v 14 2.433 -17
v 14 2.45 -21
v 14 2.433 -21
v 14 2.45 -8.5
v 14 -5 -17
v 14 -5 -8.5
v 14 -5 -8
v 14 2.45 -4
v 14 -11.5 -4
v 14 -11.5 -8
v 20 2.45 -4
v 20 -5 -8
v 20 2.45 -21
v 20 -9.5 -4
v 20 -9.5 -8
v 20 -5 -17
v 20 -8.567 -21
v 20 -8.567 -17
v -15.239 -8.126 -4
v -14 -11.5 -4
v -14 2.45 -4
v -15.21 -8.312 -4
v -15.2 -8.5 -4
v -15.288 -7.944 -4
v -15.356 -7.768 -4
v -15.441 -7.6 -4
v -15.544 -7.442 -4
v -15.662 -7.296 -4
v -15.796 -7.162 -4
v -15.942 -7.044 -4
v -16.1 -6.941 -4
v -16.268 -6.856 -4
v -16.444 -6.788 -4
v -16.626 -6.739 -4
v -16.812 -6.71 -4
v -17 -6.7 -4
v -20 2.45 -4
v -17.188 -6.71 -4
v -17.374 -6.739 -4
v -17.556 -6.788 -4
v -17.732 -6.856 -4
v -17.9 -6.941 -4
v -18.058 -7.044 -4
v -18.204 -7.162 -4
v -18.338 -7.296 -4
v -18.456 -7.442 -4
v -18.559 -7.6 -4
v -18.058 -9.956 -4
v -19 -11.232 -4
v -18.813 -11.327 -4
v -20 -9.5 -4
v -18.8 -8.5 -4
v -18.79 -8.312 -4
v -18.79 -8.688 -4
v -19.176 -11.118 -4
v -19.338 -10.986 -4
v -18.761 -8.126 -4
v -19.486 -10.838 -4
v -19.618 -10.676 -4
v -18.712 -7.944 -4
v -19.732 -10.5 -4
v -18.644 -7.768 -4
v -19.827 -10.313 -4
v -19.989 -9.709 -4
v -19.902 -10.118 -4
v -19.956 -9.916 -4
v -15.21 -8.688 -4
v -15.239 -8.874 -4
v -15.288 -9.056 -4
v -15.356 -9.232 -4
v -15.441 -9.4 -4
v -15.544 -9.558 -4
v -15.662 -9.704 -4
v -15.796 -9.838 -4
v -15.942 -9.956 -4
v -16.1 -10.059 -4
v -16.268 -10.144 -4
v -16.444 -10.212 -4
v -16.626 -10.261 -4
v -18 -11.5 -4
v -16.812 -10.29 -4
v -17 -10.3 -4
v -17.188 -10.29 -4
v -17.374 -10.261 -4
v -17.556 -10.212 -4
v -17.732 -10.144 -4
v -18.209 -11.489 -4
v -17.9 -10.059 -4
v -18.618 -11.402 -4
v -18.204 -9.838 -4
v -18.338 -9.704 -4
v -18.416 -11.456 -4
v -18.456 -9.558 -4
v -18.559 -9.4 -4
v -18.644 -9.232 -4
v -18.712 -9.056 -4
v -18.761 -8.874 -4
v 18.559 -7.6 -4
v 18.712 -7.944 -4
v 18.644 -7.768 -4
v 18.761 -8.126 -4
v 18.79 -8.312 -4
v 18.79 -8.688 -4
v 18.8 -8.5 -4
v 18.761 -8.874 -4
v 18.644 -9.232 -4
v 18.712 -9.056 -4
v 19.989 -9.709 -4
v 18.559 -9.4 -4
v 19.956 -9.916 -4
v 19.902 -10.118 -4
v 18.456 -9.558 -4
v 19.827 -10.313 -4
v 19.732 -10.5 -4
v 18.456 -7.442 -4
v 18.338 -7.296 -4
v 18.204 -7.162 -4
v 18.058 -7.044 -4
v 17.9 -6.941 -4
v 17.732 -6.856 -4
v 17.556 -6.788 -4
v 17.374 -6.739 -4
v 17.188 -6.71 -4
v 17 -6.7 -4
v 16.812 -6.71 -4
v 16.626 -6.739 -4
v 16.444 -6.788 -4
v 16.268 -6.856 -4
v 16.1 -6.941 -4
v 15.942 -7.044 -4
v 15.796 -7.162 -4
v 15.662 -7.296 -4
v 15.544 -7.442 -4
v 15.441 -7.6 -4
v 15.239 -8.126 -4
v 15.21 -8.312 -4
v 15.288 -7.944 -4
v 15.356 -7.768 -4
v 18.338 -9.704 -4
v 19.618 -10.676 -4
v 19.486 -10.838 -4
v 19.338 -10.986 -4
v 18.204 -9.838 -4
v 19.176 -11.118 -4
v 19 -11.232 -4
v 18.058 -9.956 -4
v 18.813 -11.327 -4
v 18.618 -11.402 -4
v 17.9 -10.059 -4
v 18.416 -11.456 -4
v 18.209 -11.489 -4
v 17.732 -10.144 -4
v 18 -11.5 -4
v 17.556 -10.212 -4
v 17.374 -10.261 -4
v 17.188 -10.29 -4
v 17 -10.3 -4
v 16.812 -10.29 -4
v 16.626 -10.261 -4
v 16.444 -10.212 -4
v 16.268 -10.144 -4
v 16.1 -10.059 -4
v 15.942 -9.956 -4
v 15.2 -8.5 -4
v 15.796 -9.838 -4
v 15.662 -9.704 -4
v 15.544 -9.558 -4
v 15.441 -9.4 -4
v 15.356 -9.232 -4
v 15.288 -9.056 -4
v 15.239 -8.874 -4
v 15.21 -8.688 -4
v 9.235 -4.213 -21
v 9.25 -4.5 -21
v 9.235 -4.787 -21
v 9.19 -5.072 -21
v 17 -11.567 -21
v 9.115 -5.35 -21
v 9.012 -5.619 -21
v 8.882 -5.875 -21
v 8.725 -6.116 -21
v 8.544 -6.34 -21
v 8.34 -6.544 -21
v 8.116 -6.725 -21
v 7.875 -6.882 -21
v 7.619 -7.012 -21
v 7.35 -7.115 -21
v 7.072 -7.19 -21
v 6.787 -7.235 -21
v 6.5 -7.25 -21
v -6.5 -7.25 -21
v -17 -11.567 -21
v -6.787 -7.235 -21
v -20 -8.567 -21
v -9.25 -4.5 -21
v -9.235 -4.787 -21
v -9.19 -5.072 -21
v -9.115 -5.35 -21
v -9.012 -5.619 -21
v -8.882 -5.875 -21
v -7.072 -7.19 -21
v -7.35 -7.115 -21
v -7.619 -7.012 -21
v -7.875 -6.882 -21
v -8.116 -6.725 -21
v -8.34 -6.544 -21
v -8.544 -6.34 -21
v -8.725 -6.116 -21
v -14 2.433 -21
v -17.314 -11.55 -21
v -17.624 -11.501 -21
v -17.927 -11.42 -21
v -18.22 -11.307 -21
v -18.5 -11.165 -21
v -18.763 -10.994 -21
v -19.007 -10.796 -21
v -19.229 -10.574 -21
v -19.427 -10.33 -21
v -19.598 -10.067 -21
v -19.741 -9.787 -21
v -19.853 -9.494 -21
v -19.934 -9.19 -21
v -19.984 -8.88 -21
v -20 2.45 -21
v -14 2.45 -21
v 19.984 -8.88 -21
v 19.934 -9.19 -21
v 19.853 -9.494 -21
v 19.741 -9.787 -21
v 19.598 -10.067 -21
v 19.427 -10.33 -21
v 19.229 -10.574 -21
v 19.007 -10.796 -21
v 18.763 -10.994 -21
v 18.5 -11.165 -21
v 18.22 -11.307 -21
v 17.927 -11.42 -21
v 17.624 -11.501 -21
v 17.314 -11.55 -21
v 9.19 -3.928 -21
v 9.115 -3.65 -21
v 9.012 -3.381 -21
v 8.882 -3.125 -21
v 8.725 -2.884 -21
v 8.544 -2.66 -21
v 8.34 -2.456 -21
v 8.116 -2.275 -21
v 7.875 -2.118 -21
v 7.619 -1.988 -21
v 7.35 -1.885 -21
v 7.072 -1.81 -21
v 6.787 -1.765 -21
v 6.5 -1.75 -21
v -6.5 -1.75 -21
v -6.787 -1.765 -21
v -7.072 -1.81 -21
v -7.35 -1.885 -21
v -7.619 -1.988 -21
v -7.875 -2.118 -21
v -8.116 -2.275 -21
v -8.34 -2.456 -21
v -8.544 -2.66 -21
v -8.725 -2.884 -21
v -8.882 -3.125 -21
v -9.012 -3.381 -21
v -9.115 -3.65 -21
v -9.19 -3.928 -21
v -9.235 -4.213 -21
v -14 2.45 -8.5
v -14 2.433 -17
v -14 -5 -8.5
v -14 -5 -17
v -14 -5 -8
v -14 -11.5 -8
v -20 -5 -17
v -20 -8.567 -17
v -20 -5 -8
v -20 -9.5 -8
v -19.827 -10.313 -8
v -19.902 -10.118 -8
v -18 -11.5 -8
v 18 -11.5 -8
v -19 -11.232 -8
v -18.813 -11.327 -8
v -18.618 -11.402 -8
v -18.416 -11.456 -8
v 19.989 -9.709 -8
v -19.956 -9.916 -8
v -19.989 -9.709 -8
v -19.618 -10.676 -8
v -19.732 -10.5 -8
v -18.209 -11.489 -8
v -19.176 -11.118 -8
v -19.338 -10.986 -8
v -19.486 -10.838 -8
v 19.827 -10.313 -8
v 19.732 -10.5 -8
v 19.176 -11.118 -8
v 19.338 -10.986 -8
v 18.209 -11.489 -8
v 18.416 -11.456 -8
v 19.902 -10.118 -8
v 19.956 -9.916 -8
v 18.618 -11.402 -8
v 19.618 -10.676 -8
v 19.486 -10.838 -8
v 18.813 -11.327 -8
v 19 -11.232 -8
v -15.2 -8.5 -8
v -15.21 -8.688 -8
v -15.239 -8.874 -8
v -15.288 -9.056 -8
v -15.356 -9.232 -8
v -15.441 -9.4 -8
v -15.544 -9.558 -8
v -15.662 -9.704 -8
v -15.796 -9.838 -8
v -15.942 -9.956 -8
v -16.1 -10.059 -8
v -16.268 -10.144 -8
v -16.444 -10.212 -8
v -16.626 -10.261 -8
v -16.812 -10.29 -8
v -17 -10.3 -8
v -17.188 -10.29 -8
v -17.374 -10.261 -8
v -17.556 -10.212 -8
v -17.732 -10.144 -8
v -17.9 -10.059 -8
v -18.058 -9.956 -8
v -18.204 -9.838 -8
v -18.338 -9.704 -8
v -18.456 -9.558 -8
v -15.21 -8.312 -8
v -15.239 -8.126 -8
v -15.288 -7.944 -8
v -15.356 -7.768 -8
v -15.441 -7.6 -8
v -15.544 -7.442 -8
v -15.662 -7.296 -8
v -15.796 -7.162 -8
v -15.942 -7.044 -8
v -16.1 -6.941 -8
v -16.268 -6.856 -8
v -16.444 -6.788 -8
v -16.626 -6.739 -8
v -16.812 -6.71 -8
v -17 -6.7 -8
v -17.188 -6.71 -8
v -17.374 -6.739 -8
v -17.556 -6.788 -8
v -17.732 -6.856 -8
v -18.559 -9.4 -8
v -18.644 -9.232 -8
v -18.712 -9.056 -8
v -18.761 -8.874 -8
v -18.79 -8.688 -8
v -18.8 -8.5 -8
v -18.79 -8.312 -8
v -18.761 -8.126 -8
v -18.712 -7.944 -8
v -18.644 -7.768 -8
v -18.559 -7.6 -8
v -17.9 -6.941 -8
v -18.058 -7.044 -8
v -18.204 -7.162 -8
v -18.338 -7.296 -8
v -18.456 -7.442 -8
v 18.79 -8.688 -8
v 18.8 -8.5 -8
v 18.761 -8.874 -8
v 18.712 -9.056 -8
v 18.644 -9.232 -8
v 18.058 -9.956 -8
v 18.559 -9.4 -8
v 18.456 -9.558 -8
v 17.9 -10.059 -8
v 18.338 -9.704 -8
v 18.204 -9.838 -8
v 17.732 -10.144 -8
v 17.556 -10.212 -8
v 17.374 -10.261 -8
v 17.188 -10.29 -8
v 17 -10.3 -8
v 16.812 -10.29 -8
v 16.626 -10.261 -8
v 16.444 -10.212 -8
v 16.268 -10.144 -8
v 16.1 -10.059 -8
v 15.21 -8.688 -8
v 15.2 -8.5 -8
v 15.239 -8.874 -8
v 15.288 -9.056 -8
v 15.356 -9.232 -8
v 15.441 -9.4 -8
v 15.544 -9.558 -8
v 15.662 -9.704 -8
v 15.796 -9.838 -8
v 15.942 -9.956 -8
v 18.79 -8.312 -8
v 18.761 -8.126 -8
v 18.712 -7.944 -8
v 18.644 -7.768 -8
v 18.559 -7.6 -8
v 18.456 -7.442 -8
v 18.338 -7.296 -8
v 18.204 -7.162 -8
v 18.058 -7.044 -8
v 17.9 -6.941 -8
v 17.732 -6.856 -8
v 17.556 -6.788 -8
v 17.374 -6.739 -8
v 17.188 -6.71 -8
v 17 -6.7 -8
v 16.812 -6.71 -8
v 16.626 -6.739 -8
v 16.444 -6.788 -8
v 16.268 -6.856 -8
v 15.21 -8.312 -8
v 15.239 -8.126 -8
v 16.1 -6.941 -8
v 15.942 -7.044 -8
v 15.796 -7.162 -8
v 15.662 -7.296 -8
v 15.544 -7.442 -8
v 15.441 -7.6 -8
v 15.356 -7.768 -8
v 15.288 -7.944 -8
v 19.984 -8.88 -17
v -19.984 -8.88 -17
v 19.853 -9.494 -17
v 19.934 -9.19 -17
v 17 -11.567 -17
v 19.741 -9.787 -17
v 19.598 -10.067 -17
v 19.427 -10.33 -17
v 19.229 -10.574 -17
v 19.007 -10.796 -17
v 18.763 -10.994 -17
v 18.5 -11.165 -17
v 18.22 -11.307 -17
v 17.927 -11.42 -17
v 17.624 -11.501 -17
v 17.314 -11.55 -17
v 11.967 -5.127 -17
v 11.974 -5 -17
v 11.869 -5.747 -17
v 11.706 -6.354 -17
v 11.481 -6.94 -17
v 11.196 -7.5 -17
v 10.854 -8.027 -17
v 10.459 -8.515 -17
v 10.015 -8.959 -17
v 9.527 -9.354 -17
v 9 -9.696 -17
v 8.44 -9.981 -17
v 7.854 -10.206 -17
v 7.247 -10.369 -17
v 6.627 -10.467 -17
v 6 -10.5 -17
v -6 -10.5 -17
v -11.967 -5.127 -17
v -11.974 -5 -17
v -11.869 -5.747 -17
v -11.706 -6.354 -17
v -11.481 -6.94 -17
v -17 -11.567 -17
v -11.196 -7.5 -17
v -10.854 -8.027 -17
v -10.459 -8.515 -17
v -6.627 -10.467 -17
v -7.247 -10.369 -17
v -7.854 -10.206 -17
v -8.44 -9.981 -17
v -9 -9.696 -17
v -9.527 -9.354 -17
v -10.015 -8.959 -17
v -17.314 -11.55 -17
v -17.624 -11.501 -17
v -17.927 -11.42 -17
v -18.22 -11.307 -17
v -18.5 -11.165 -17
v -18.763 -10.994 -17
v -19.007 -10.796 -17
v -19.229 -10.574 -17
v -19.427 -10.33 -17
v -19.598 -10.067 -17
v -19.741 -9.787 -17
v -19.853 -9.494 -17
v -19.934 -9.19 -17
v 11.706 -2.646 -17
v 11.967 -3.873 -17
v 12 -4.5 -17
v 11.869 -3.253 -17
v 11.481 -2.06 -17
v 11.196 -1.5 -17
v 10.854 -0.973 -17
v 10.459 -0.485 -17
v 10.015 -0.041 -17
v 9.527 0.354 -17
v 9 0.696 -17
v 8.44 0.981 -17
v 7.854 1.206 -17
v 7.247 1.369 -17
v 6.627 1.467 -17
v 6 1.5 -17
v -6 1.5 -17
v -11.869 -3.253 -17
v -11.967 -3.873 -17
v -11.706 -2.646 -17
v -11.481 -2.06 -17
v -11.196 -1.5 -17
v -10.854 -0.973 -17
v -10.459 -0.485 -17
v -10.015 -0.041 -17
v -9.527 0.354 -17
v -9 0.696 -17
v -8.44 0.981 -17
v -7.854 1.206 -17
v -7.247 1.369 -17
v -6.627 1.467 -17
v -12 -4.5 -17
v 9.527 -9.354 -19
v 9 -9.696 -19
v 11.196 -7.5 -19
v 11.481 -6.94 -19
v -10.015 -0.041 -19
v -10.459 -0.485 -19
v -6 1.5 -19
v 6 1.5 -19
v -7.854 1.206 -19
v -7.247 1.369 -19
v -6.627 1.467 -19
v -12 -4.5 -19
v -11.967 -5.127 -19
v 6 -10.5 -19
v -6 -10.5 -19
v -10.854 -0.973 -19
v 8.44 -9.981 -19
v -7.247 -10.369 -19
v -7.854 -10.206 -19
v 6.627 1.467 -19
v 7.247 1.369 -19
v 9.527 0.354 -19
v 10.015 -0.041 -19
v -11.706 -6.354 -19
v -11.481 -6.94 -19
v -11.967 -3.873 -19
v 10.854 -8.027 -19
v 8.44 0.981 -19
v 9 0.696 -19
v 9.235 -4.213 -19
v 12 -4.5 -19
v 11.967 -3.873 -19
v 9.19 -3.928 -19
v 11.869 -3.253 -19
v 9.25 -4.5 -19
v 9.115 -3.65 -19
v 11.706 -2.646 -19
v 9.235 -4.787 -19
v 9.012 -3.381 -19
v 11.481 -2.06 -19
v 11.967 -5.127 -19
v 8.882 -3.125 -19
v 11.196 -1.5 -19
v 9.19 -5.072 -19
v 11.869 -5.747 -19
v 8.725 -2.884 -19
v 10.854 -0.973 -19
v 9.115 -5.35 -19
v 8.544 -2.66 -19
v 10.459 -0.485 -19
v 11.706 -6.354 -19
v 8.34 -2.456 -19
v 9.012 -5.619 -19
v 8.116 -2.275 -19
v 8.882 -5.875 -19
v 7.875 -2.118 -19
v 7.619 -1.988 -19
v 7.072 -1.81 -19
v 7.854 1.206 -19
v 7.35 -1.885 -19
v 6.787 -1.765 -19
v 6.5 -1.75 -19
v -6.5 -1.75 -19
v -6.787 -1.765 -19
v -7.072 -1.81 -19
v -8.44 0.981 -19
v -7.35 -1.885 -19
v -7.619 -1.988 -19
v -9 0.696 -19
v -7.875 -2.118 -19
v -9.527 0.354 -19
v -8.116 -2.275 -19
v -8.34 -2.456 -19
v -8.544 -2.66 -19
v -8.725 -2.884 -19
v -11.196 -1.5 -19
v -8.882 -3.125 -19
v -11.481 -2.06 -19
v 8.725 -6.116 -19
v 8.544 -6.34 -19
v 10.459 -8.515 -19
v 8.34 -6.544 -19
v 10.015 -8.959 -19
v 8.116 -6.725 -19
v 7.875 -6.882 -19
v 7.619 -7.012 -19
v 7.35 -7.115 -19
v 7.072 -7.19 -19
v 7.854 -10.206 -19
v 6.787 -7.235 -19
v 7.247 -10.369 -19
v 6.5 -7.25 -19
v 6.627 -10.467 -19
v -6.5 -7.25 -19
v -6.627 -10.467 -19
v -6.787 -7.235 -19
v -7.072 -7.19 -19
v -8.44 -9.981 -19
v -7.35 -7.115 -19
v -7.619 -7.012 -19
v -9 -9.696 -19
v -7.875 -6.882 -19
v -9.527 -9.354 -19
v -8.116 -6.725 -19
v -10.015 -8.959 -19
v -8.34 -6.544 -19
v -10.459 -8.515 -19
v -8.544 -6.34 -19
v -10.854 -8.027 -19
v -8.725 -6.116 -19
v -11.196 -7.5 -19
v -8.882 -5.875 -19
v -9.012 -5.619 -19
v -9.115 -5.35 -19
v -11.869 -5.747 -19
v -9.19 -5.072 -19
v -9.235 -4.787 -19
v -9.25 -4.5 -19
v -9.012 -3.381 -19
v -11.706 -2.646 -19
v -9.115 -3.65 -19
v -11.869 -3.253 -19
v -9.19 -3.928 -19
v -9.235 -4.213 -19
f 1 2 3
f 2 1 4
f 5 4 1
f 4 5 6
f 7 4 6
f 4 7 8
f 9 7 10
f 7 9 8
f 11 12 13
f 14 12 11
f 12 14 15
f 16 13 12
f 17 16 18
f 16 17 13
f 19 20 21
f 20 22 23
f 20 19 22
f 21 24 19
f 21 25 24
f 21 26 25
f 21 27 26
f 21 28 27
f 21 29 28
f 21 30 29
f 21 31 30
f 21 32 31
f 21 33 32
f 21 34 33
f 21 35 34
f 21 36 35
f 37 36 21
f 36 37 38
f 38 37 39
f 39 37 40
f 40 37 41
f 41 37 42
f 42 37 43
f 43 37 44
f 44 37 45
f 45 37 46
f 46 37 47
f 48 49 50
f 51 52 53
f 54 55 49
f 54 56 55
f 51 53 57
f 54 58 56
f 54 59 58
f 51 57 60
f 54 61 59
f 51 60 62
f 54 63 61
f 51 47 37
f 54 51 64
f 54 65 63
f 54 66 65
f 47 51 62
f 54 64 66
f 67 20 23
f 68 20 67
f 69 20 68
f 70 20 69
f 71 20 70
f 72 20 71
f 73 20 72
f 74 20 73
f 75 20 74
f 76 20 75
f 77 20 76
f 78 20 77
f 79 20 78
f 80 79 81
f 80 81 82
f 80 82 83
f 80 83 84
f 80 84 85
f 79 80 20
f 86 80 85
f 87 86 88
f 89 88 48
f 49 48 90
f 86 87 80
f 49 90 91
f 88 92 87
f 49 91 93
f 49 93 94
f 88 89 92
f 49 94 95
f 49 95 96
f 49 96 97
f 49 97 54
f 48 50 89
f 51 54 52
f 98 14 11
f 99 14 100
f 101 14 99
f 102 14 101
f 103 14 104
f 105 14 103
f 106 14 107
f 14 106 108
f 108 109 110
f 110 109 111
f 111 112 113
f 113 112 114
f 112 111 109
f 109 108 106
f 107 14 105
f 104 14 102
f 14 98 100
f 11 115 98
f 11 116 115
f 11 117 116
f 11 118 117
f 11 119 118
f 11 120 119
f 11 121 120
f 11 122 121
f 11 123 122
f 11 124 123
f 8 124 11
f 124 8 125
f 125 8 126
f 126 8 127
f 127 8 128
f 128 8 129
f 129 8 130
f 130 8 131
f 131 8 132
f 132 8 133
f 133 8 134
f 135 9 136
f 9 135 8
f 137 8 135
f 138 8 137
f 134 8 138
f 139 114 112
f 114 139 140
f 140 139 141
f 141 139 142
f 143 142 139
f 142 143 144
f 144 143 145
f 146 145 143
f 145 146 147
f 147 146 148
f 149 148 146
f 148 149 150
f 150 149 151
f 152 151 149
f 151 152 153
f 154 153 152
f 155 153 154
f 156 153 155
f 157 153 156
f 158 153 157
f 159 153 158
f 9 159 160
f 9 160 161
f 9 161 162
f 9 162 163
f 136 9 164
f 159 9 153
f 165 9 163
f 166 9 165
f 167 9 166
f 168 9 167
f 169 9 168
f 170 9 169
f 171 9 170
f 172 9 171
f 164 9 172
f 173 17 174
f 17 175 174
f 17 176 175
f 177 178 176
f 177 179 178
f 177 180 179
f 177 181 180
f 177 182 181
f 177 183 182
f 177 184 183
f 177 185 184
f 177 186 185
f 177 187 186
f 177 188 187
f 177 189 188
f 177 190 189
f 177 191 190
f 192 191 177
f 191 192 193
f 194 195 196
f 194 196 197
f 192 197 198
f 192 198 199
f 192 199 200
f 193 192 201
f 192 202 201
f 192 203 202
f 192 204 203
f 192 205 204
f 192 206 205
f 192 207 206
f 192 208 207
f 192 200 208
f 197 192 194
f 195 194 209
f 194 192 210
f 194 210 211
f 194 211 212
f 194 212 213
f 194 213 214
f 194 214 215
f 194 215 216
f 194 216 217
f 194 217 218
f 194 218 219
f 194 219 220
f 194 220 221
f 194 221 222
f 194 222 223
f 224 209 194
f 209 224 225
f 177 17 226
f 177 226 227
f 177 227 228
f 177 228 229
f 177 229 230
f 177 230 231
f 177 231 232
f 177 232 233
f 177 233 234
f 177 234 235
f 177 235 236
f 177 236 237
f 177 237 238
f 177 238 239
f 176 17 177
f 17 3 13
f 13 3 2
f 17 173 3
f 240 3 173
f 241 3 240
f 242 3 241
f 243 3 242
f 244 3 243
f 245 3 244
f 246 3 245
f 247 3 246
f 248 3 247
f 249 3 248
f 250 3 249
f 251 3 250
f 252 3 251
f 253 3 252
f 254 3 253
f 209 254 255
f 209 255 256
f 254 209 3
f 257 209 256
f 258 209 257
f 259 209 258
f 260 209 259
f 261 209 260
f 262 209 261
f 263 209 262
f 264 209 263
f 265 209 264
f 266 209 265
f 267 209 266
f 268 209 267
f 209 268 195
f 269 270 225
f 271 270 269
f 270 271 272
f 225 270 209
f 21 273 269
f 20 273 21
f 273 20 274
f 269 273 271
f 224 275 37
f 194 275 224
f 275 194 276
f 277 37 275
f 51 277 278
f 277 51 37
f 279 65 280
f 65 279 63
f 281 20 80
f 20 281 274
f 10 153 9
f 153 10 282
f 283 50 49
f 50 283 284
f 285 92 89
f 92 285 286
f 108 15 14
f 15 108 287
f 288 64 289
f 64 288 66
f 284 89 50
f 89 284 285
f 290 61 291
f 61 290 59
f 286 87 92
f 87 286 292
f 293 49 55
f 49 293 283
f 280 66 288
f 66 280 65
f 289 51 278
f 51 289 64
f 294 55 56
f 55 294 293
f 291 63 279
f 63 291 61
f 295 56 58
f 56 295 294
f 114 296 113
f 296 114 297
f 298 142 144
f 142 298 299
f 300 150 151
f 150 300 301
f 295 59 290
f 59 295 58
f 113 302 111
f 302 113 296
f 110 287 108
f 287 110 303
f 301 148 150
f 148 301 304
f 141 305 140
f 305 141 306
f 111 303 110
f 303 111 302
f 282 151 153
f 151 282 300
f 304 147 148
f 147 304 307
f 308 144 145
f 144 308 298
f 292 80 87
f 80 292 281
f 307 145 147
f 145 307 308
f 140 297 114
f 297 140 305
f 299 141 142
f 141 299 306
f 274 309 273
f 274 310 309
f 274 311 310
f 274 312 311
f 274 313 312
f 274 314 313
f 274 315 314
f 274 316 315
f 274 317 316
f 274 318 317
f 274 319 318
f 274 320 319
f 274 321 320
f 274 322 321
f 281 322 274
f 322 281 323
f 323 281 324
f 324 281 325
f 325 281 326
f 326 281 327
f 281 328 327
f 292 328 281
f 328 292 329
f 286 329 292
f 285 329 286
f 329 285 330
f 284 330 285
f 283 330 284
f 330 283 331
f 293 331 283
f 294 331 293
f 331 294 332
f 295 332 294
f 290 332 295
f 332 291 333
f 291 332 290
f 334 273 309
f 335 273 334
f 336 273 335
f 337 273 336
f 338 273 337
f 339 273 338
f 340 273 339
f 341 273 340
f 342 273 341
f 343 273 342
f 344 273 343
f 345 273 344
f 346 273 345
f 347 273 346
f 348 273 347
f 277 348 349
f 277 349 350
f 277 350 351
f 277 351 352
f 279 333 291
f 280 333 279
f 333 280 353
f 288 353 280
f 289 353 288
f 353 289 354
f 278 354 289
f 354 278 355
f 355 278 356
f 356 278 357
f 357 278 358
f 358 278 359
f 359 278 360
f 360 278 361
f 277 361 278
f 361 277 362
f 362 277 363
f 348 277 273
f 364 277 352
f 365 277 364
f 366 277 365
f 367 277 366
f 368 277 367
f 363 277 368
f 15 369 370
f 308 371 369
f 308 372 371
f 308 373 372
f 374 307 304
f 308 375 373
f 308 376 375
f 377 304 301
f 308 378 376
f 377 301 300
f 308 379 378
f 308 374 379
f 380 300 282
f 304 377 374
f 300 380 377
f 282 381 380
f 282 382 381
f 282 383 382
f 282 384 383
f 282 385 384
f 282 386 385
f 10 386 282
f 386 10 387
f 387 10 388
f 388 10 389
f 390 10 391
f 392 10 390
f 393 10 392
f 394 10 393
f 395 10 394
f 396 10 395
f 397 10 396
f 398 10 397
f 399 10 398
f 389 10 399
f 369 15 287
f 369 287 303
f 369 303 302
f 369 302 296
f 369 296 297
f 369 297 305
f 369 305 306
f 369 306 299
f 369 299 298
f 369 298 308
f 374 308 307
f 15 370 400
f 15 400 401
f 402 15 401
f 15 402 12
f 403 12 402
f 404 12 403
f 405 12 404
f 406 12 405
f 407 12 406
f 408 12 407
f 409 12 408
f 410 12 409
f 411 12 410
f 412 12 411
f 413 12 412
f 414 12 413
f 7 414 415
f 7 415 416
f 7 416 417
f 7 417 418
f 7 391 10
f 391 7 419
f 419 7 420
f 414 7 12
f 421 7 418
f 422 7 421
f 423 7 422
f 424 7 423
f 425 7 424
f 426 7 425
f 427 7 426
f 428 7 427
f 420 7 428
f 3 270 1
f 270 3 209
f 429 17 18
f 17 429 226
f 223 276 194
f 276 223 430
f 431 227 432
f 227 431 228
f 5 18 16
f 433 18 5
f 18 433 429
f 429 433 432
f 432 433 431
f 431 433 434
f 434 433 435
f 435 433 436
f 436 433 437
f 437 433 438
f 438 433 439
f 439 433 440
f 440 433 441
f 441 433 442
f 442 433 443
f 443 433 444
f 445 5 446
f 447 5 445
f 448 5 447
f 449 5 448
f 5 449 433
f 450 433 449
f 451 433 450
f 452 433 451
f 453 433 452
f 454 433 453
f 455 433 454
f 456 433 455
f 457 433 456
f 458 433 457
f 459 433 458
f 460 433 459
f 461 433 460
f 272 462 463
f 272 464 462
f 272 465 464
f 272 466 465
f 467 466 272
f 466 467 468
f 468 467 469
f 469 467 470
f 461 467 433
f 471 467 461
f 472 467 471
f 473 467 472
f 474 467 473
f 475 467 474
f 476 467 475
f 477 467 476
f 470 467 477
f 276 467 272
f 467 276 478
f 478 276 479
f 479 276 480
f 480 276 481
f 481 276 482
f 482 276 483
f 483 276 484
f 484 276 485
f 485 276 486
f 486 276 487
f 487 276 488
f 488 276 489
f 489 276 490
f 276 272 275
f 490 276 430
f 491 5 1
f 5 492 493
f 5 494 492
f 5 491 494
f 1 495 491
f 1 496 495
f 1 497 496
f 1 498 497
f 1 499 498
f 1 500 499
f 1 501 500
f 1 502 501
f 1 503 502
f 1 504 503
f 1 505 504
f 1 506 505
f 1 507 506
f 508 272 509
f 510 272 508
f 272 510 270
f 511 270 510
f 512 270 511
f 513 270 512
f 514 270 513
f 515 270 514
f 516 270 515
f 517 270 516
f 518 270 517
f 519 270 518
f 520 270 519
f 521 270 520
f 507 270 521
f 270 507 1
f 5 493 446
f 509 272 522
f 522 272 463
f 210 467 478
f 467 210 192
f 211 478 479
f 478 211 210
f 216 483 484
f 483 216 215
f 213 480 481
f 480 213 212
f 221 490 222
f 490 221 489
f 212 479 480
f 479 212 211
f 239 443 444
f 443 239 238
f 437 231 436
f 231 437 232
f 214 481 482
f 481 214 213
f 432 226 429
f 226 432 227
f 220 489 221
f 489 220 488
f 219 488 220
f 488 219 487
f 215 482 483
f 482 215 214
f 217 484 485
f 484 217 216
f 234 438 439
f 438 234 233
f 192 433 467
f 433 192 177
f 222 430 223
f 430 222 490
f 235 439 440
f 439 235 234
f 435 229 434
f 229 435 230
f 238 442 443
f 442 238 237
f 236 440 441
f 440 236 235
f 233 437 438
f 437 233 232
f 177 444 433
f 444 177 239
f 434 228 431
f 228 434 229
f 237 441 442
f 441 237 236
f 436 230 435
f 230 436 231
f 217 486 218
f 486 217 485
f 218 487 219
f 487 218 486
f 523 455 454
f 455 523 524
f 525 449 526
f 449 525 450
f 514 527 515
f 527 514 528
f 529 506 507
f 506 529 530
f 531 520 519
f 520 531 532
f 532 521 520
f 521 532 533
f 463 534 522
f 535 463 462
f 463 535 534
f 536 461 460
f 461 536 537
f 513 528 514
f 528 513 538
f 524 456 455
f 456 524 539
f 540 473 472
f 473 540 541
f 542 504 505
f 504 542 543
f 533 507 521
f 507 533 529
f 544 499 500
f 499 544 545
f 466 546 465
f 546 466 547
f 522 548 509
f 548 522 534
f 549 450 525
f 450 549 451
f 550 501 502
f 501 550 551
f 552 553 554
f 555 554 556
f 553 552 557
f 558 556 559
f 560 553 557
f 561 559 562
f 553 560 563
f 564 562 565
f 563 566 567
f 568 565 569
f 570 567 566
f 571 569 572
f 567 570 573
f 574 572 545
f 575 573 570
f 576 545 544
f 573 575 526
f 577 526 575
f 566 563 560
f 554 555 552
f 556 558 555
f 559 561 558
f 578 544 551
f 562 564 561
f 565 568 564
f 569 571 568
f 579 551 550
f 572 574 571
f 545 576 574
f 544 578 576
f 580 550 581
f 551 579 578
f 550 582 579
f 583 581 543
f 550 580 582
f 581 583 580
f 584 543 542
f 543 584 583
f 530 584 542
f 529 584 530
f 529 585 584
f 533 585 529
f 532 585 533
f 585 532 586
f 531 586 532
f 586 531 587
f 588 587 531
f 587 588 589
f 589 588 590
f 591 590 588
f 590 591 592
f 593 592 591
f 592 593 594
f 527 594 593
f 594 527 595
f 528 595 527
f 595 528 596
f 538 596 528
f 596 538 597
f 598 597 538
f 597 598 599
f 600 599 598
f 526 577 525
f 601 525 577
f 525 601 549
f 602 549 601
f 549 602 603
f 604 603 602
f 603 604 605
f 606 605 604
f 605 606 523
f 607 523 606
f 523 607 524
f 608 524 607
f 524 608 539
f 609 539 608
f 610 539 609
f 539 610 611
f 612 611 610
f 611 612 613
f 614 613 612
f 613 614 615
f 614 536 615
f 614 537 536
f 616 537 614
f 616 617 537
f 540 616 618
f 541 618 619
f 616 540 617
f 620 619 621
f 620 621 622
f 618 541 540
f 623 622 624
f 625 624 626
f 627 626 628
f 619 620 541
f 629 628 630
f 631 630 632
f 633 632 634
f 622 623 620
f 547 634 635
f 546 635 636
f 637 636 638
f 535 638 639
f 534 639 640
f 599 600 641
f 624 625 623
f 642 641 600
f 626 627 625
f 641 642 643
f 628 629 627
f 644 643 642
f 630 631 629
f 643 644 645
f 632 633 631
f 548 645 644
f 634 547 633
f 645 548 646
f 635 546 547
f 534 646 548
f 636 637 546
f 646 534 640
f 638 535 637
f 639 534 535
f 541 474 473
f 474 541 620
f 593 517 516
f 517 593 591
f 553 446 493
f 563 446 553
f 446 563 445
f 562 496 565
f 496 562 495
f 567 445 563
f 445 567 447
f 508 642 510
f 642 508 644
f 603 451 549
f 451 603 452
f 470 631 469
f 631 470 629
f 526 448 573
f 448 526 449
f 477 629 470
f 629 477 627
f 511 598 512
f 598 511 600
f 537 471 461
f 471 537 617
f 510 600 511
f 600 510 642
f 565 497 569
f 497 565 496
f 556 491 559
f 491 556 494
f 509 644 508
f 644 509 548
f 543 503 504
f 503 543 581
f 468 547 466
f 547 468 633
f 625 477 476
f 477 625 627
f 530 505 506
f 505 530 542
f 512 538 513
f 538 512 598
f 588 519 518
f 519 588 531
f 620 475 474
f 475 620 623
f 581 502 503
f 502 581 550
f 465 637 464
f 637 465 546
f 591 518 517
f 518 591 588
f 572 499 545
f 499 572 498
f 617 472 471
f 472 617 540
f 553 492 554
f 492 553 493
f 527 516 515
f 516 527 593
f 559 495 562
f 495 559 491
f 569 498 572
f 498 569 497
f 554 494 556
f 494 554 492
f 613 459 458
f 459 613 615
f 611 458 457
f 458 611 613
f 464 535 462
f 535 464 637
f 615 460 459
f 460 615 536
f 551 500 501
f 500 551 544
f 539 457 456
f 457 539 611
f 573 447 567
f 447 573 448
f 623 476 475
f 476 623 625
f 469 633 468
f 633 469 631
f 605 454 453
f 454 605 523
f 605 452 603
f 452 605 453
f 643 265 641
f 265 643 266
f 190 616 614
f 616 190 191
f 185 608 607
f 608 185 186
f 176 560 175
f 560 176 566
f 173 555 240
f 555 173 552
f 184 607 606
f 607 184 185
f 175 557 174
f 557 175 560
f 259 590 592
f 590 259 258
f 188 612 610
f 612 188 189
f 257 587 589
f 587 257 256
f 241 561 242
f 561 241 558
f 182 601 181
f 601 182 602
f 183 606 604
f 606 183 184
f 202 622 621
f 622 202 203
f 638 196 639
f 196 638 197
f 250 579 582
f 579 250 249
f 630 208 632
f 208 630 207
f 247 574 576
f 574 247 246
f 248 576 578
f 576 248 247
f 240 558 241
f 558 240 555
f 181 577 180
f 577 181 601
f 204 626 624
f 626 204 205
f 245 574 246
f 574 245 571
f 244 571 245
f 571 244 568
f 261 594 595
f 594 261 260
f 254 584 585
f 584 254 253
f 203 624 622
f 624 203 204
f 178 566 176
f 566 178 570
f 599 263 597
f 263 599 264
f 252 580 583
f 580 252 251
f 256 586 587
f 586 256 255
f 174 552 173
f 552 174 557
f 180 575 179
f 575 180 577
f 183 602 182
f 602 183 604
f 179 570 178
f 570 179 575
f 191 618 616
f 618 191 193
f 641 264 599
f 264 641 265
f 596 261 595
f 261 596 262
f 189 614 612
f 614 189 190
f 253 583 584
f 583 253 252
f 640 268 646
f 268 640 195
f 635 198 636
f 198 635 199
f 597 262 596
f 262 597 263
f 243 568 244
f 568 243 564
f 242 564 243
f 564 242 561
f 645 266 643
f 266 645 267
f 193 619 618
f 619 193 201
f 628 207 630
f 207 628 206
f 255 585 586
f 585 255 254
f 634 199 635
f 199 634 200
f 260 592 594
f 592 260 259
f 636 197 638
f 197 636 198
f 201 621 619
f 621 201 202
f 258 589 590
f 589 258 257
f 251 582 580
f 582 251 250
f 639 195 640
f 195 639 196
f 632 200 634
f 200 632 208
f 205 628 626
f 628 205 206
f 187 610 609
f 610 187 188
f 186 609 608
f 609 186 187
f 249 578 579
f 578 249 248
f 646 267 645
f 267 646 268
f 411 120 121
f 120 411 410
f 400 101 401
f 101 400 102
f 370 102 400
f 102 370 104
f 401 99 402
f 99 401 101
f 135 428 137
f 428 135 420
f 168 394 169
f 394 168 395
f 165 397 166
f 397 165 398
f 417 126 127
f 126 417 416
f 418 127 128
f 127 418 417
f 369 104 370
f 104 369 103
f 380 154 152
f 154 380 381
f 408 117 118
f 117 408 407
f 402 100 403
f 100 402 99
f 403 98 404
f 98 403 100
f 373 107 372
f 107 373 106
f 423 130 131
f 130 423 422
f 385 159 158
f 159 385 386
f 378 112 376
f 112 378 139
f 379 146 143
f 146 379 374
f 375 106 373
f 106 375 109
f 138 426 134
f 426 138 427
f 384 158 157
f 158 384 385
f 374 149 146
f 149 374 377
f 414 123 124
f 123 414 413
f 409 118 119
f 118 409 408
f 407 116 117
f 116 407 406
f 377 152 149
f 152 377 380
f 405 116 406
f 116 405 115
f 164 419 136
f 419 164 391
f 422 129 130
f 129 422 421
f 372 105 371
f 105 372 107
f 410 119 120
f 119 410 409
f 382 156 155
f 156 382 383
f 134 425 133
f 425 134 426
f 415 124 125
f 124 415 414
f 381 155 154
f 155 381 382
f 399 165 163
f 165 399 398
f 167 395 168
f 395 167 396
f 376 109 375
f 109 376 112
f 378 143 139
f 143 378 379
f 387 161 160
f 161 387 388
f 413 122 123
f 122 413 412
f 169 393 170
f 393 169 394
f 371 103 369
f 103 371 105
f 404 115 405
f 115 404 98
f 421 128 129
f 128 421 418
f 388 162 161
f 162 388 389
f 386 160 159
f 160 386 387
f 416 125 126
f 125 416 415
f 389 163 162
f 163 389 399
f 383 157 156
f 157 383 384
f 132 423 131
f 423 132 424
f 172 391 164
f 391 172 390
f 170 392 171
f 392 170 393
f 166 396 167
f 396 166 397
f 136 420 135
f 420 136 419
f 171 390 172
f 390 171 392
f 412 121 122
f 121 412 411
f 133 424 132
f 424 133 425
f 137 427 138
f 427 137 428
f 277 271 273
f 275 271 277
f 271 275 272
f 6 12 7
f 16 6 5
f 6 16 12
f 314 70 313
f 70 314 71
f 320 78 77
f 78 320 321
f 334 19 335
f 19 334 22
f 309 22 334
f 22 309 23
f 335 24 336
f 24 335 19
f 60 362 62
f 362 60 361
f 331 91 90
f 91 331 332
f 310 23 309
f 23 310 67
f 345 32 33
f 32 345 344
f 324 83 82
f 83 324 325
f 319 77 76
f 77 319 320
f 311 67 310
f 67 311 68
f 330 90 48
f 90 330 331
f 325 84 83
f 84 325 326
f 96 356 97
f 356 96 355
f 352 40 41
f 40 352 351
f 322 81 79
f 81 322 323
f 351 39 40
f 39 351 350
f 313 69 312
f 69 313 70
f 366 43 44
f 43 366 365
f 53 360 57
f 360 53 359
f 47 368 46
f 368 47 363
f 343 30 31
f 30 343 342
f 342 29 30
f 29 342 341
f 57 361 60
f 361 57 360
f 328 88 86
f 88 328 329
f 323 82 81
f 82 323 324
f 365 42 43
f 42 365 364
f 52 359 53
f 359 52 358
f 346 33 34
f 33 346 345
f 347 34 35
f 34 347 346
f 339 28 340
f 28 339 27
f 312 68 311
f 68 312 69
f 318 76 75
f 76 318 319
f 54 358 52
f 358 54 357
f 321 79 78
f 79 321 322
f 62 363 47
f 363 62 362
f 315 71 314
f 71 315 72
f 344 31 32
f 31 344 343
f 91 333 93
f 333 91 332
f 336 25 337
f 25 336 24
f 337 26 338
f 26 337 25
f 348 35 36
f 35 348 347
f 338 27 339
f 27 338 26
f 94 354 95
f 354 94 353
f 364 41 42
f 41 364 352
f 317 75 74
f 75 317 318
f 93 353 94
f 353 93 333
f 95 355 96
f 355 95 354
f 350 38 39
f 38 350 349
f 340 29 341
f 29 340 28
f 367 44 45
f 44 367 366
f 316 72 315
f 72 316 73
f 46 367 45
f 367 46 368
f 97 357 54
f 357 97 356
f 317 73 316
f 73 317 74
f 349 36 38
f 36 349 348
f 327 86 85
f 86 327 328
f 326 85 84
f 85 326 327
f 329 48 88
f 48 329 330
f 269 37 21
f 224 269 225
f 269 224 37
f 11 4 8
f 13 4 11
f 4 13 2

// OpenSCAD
$fn = 60;


fuseHolderWidth = 20;
fuseHolderDepth = 7;
fuseHolderHeight = 7.5 ;

baseHolderWidth = 40;
baseHolderDepth = 23;
baseHolderHeight = fuseHolderHeight+1 ;

blankHoleOffsetX = 1;
blankHoleOffsetY = 1;

boltHole = 3.6;

cableDiamiter = 3.3;
//color("grey",.1)
//translate([0,0,10]) top();

//color("grey",.1)
//bottom();

//color("grey",.1)
translate([0,0,-6]) legs();


////////////////////////////////////////////////////////////////////////////////////////////////////
module legs(){

	legHeigth = 17;
	legWidth = 6;
	legTopHeigth = 4;
	footWidth = 16;
	footHeigth = 4;
	footDepth =14;

		
	difference(){
		union(){
			plate4Point(baseHolderWidth,baseHolderDepth,legTopHeigth,4);   // Top Plate
				
			translate([0, (-1*(footDepth/3))+.1, -1*((legHeigth)-(footHeigth))])
				plate4Point(baseHolderWidth, footDepth, legTopHeigth, 6);   // foot

			difference(){
				for(a=[1,-1]){
					difference(){
						translate([a*(baseHolderWidth-legWidth)/2, 0, -1*(legHeigth/2)+(legTopHeigth/2)])
							plate2Point(baseHolderDepth,legHeigth,legWidth);   // Leg
					}
				}
//				translate([0,10.5,-13])
//					rotate([0,90,0])
//					scale([1.5,.8,1])
//					cylinder(d=20.2, h=baseHolderWidth+5, center=true);
				}
		}
		translate([0,5,0])																								// Top Cutout
			plate4Point(baseHolderWidth-12,baseHolderDepth+20,legTopHeigth+1,4);

		rotate([0,0,90])																									// Screw slot
			translate([-(baseHolderWidth-footWidth-15)/2, 0, 2])
			screwSlot(12, 5.5, baseHolderWidth-4-legWidth*2);
			
		for(a = [[1,1],[-1,1],[1,-1],[-1,-1]]){
			translate([																											// Corner Hole
				a[0]*((baseHolderWidth/2)-(4/2)-blankHoleOffsetX),
				a[1]*((baseHolderDepth/2)-(4/2)-blankHoleOffsetY),
				0])
				cylinder(d=boltHole, h=20, center=true);
			translate([																											// Nutt Slot
				a[0]*((baseHolderWidth/2)-(4/2)-blankHoleOffsetX),
				a[1]*((baseHolderDepth/2)-(4/2)-blankHoleOffsetY),
				-3.5]) // nut slot
				rotate([0,0,90])
				nuttSlot();
		}

		translate([0,-9.5,-7.5])
		 cube([50,9,7],center=true);
			
		translate([0,7.45,-12])
			cube([baseHolderWidth+5,10,30],center=true);

	}
}
////////////////////////////////////////////////////////////////////////////////////////////////////
module bottom(){
	difference(){
		union(){
			plate4Point(baseHolderWidth,baseHolderDepth,(baseHolderHeight/2)+1,4);

			for(b=[1,-1]){
				difference(){
					hull(){
						translate([0,b*4.5,0])															// Strap Support
								rotate([0,90,0])
								cylinder(d=cableDiamiter*2, h=baseHolderWidth+18, center=true);
						translate([0,b*4.5,3])															// Strap Support
								rotate([0,90,0])
								cylinder(d=cableDiamiter*2, h=baseHolderWidth+18, center=true);
						}
						
					translate([((baseHolderWidth/2)+5),b*4.5,5])					// Strap Cutout Top
						cube([4,10,10],center=true);
//					translate([((baseHolderWidth/2)+5),b*4.5,-6.7])					// Strap Cutout bot
//						cube([3,10,10],center=true);

					translate([-((baseHolderWidth/2)+5),b*4.5,5])					// Strap Cutout Top
						cube([4,10,10],center=true);
//					translate([-((baseHolderWidth/2)+5),b*4.5,-6.7])					// Strap Cutout bot
//						cube([3,10,10],center=true);
						
					translate([0,0,4])																	// Cut Support Flat Top
						plate4Point(baseHolderWidth+20,baseHolderDepth+10,(baseHolderHeight/2)+1,5);
					
					translate([0,0,-5.25])																	// Cut Support Flat Bot
						plate4Point(baseHolderWidth+20,baseHolderDepth+10,(baseHolderHeight/2)+1,5);
				}
			}
		}
		translate([(baseHolderWidth/2)-(fuseHolderWidth)-3,-(baseHolderDepth/2)+(fuseHolderDepth*2.3),(-(baseHolderHeight - fuseHolderHeight)/2)+3])
			holderBlock("c");
		translate([(baseHolderWidth/2)-(fuseHolderWidth/2)-7,-(baseHolderDepth/2)+(fuseHolderDepth),(-(baseHolderHeight - fuseHolderHeight)/2)+3])
			holderBlock("c");
			
		for(a=[1,-1]){
			hull(){
				translate([0,a*4.5,.5])
					rotate([0,90,0])
					cylinder(d=cableDiamiter, h=baseHolderWidth+20, center=true);
				translate([0,a*4.5,5])
					rotate([0,90,0])
					cylinder(d=cableDiamiter, h=baseHolderWidth+20, center=true);
			}
		}
	//	translate([0,0,-10])		cube([40,40,40]);

		for(a = [[1,1],[-1,1],[1,-1],[-1,-1]]){
			translate([																											// Corner Hole
				a[0]*((baseHolderWidth/2)-(4/2)-blankHoleOffsetX),
				a[1]*((baseHolderDepth/2)-(4/2)-blankHoleOffsetY),
				0])
				cylinder(d=boltHole, h=10, center=true);
		}
	}
		for(a = [[-1,0],[1,0]]){
			translate([																											// Corner Hole
				a[0]*((baseHolderWidth/2)-(4/2)-blankHoleOffsetX),
				a[1]*((baseHolderDepth/2)-(4/2)-blankHoleOffsetY),
				(baseHolderHeight/4)])
				sphere(d=boltHole-1,center=true);
		}
	translate([(baseHolderWidth/2)-(fuseHolderWidth)-3,-(baseHolderDepth/2)+(fuseHolderDepth*2.3),(-(baseHolderHeight - fuseHolderHeight)/2)+.87])
		cube([3,fuseHolderDepth+1,baseHolderHeight-4],center=true);
	translate([(baseHolderWidth/2)-(fuseHolderWidth/2)-7,-(baseHolderDepth/2)+(fuseHolderDepth),(-(baseHolderHeight - fuseHolderHeight)/2)+.87])
		cube([3,fuseHolderDepth+1,baseHolderHeight-4],center=true);
}
////////////////////////////////////////////////////////////////////////////////////////////////////
module top(){
	//cube([40,23,2],center=true);
	difference(){
		plate4Point(baseHolderWidth,baseHolderDepth,baseHolderHeight,4);

		translate([(baseHolderWidth/2)-(fuseHolderWidth)-3,-(baseHolderDepth/2)+(fuseHolderDepth*2.3),(-(baseHolderHeight - fuseHolderHeight)/2)-.1])
			holderBlock("c");
		translate([(baseHolderWidth/2)-(fuseHolderWidth/2)-7,-(baseHolderDepth/2)+(fuseHolderDepth),(-(baseHolderHeight - fuseHolderHeight)/2)-.1])
			holderBlock("c");
			
	//	translate([0,0,-10])		cube([40,40,40]);

		for(a = [[1,1],[-1,1],[1,-1],[-1,-1]]){
			translate([																											// Corner Hole
				a[0]*((baseHolderWidth/2)-(4/2)-blankHoleOffsetX),
				a[1]*((baseHolderDepth/2)-(4/2)-blankHoleOffsetY),
				0])
				cylinder(d=boltHole, h=10, center=true);
		}
		for(a = [[-1,0],[1,0]]){
			translate([																											// Center Hole
				a[0]*((baseHolderWidth/2)-(4/2)-blankHoleOffsetX),
				a[1]*((baseHolderDepth/2)-(4/2)-blankHoleOffsetY),
				-2])
				cylinder(d=boltHole, h=5, center=true);
			
		}
	}

/*
color("DarkGray")
	translate([(baseHolderWidth/2)-(fuseHolderWidth/2)-6,-(baseHolderDepth/2)+(fuseHolderDepth/2)+2,0])
	holderBlock();

color("Gray")
	translate([(baseHolderWidth/2)-(fuseHolderWidth)-4,-(baseHolderDepth/2)+(fuseHolderDepth*2),0])
	holderBlock();
*/
}
module holderBlock(inType="m"){

	wallThickness = 1.2;
	
	feetWidth = 1.62;
	feetDepth = .38;
	feetHeight = 2.45;
	
	if(inType == "m"){
		difference(){
			cube([fuseHolderWidth,fuseHolderDepth,fuseHolderHeight],center=true);
			translate([0,0,wallThickness])
				cube([fuseHolderWidth-(wallThickness*2),fuseHolderDepth-(wallThickness*2),fuseHolderHeight],center=true);
		}
	} else {
		union(){
			cube([fuseHolderWidth,fuseHolderDepth,fuseHolderHeight],center=true);
//			translate([0,0,-1])
//				cube([fuseHolderWidth+1,fuseHolderDepth+1,fuseHolderHeight],center=true);
		}
		translate([0,0,10])
			cube([fuseHolderWidth-(wallThickness),fuseHolderDepth-(wallThickness),fuseHolderHeight+10],center=true);
	}
	
}
////////////////////////////////////////////////////////////////////////////////////////////////////
module plate4Point(x,y,z,d){
	hull(){
		color("green") translate([(x/2)-(d/2) ,(y/2) -(d/2),0]) cylinder(h=z, d=d, center=true);
		color("blue")  translate([(x/2)-(d/2) ,-(y/2)+(d/2),0]) cylinder(h=z, d=d, center=true);
		color("red")   translate([-(x/2)+(d/2),(y/2) -(d/2),0]) cylinder(h=z, d=d, center=true);
		color("grey")  translate([-(x/2)+(d/2),-(y/2)+(d/2),0]) cylinder(h=z, d=d, center=true);
	}
}
////////////////////////////////////////////////////////////////////////////////////////////////////
module plate2Point(y,z,d){
	hull(){
		color("green") translate([0 ,(y/2) -(d/2),0]) cylinder(h=z, d=d, center=true);
		color("blue")  translate([0 ,-(y/2)+(d/2),0]) cylinder(h=z, d=d, center=true);
	}
}
////////////////////////////////////////////////////////////////////////////////////////////////////
module screwCutOut(headDiamitor, shaftDiamitor){

	cylinder(h=10, d=headDiamitor, center=true);
	translate([0,0,-9])
		cylinder(h=10, d=shaftDiamitor, center=true);

}
////////////////////////////////////////////////////////////////////////////////////////////////////
module screwSlot(headDiamitor, shaftDiamitor, slotWidth){

	plate2Point(slotWidth,30,headDiamitor);
	translate([0,0,-9])
		plate2Point(slotWidth-shaftDiamitor,20,shaftDiamitor);

}
////////////////////////////////////////////////////////////////////////////////////////////////////
module nuttSlot(){
	cube([7,20,3],center=true);
}
